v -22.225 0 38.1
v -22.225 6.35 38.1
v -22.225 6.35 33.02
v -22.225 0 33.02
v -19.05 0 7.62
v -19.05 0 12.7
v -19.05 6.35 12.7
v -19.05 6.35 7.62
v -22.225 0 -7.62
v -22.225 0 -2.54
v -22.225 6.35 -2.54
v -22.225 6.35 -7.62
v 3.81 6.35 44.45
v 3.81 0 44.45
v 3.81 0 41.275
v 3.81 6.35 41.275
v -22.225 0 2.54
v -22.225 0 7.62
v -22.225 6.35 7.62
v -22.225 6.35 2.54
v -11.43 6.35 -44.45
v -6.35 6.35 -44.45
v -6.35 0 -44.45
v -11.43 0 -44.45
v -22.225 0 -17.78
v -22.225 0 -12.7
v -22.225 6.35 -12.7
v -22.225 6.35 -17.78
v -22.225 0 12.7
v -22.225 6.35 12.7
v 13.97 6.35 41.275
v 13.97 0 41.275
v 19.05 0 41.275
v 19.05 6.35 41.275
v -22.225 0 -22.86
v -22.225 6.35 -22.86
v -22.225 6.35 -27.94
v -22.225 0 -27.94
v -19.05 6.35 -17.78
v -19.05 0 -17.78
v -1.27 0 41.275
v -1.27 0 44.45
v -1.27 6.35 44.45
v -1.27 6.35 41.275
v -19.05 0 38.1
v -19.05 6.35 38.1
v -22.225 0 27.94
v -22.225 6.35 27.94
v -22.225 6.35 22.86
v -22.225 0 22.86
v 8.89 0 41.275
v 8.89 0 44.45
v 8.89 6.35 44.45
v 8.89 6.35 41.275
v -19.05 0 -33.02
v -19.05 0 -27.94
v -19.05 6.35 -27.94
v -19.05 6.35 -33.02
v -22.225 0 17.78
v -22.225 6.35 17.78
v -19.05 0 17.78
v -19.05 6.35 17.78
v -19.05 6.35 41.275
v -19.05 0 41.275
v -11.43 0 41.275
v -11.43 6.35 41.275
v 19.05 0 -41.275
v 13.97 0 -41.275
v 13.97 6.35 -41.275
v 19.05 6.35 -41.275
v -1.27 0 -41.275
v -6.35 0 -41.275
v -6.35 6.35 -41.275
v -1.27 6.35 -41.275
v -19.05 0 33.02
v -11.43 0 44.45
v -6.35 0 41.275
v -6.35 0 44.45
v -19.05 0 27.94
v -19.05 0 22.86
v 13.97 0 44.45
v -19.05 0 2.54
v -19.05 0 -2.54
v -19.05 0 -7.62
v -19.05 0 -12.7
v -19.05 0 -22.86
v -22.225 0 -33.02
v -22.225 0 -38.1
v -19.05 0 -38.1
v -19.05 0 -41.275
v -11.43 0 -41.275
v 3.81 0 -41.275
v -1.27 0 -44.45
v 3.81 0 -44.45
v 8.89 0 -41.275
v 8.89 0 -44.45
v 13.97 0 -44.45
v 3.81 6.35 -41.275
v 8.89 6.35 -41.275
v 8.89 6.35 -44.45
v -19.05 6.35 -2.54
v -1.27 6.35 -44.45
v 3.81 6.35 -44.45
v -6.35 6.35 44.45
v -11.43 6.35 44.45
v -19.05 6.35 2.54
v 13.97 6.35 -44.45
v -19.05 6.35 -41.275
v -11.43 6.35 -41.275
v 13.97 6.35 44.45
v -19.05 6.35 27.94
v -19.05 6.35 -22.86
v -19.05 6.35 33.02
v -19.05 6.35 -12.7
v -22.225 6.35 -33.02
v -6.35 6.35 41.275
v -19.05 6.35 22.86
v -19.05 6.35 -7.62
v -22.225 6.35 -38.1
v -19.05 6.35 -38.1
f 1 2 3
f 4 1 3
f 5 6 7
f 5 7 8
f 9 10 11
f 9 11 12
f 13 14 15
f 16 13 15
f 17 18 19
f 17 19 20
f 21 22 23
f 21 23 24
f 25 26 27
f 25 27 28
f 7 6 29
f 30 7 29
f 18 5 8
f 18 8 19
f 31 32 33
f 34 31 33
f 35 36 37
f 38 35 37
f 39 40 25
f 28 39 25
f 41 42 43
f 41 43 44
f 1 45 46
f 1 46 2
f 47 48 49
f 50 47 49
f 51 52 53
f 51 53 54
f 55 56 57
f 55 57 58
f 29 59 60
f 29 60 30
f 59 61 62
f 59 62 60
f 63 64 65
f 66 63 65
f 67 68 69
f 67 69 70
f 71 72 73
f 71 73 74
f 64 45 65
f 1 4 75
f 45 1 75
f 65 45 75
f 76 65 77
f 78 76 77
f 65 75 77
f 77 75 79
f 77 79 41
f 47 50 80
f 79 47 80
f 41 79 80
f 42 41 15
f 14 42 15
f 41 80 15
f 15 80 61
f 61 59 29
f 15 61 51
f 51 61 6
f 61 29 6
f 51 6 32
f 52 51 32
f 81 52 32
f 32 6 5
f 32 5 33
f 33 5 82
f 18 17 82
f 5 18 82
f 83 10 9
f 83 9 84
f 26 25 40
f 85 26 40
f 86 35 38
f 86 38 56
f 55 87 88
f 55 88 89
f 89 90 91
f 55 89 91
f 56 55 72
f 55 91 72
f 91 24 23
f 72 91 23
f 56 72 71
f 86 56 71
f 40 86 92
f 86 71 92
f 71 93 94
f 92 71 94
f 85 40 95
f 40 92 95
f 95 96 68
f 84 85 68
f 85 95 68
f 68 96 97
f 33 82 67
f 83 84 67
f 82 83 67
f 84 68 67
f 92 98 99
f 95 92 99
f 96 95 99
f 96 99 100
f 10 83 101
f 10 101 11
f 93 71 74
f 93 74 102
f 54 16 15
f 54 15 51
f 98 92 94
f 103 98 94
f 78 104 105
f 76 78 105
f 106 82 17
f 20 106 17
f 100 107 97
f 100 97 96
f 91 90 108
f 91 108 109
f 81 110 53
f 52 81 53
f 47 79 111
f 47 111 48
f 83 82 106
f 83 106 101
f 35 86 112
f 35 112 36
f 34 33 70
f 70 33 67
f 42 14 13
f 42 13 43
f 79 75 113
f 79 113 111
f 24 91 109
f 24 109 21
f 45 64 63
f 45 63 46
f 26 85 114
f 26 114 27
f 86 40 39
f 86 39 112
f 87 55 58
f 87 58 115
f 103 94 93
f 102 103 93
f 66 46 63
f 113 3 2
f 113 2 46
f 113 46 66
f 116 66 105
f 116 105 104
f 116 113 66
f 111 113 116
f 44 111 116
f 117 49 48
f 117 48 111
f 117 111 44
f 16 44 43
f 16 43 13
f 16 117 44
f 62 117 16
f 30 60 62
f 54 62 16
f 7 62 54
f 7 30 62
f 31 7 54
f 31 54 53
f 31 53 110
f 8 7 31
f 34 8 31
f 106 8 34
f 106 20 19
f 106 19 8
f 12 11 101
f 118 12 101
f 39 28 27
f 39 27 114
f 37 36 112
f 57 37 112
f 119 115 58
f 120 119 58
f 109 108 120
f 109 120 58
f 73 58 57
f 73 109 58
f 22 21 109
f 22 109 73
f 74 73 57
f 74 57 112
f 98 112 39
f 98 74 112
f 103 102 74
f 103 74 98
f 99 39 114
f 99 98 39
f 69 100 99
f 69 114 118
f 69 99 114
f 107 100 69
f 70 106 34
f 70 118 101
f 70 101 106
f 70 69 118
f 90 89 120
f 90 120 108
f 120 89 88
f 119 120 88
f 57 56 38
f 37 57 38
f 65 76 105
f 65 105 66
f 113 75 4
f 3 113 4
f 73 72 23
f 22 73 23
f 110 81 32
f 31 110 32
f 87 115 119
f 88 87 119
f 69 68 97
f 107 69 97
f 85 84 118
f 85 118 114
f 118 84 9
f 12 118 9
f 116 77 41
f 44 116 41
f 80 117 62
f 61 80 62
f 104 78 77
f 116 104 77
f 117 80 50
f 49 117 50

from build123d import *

# Parameters (mm, degrees)
SKETCH1_W           = 38.1
SKETCH1_H           = 82.55
BOSS_EXTRUDE1_DEPTH = 6.35
SKETCH2_W           = 5.08
SKETCH2_H           = 3.175
SKETCH2_W_2         = 3.175
SKETCH2_H_2         = 5.08
BOSS_EXTRUDE2_DEPTH = 6.35


with BuildPart() as part:
    # Sketch1 → Boss-Extrude1 (new body)
    with BuildSketch(Plane(origin=(0, 0, 0), x_dir=(1, 0, 0), z_dir=(0, 1, 0))):
        Rectangle(SKETCH1_W, SKETCH1_H)
    extrude(amount=BOSS_EXTRUDE1_DEPTH)

    # Sketch2 → Boss-Extrude2 (add)
    with BuildSketch(Plane(origin=(0, 0, 0), x_dir=(-1, 0, 0), z_dir=(0, -1, 0))):
        with Locations((-11.43, 42.8625)):
            Rectangle(SKETCH2_W, SKETCH2_H)
        with Locations((20.6375, 35.56)):
            Rectangle(SKETCH2_W_2, SKETCH2_H_2)
        with Locations((-1.27, 42.8625)):
            Rectangle(SKETCH2_W, SKETCH2_H)
        with Locations((8.89, 42.8625)):
            Rectangle(SKETCH2_W, SKETCH2_H)
        with Locations((20.6375, 25.4)):
            Rectangle(SKETCH2_W_2, SKETCH2_H_2)
        with Locations((20.6375, 15.24)):
            Rectangle(SKETCH2_W_2, SKETCH2_H_2)
        with Locations((20.6375, 5.08)):
            Rectangle(SKETCH2_W_2, SKETCH2_H_2)
        with Locations((20.6375, -5.08)):
            Rectangle(SKETCH2_W_2, SKETCH2_H_2)
        with Locations((20.6375, -15.24)):
            Rectangle(SKETCH2_W_2, SKETCH2_H_2)
        with Locations((20.6375, -25.4)):
            Rectangle(SKETCH2_W_2, SKETCH2_H_2)
        with Locations((20.6375, -35.56)):
            Rectangle(SKETCH2_W_2, SKETCH2_H_2)
        with Locations((8.89, -42.8625)):
            Rectangle(SKETCH2_W, SKETCH2_H)
        with Locations((-1.27, -42.8625)):
            Rectangle(SKETCH2_W, SKETCH2_H)
        with Locations((-11.43, -42.8625)):
            Rectangle(SKETCH2_W, SKETCH2_H)
    extrude(amount=-BOSS_EXTRUDE2_DEPTH)


solid = part.part
